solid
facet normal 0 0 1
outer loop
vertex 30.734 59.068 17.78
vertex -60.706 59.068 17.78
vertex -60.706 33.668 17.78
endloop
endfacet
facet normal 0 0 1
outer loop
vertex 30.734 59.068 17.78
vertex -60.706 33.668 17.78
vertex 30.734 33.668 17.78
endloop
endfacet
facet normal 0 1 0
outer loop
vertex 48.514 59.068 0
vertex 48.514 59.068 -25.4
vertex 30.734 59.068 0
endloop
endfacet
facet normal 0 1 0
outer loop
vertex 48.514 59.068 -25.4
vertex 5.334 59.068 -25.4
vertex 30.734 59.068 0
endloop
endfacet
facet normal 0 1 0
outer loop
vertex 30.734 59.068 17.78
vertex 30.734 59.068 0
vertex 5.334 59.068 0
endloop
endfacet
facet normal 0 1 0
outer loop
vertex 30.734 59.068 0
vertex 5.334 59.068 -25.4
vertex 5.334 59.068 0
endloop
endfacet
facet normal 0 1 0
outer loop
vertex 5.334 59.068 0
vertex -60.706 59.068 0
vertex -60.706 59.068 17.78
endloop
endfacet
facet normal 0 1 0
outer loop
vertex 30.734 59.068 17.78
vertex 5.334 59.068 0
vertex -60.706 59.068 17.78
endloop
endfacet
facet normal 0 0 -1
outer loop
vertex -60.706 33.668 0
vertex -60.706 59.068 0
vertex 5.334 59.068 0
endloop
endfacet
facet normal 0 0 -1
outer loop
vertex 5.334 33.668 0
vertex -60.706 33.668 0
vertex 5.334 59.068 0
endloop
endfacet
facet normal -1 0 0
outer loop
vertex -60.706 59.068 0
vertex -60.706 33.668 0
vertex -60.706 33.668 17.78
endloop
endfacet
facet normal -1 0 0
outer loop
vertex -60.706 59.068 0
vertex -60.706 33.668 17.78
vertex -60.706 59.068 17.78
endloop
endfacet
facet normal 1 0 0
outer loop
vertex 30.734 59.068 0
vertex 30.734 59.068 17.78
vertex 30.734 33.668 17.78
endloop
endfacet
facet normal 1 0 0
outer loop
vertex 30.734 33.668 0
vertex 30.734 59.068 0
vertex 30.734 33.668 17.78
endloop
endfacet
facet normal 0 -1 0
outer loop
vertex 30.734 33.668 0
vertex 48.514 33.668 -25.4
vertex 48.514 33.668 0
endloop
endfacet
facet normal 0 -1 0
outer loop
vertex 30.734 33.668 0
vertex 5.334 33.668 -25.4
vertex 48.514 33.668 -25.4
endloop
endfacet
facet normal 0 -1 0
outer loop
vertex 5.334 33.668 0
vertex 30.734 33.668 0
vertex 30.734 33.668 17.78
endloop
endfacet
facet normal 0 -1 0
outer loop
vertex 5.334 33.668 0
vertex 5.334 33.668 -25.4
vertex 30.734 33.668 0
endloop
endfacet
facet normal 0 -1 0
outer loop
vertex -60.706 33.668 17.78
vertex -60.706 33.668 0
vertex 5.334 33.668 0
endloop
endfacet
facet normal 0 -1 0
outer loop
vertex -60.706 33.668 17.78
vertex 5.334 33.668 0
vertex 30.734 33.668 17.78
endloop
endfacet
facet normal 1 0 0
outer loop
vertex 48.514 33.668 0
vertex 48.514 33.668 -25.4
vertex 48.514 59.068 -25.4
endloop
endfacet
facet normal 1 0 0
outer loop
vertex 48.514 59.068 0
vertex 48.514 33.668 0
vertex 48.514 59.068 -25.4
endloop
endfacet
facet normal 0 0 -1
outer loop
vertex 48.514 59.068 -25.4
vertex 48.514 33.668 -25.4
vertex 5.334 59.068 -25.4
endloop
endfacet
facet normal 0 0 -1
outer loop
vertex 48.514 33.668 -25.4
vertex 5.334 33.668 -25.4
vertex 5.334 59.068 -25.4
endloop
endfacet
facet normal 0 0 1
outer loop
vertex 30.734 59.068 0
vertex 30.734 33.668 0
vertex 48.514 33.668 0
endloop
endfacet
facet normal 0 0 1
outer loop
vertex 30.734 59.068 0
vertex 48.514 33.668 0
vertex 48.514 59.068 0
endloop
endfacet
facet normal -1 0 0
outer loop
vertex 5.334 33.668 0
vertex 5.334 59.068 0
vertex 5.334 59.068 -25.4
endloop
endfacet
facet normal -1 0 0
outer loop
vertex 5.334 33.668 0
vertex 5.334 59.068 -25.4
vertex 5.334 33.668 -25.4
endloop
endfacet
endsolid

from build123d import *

# Parameters (mm, degrees)
F0_W     = 91.44
F0_H     = 25.4
F1_DEPTH = 17.78
F2_W     = 25.4
F2_H     = 25.4
F3_DEPTH = 25.4
F4_W     = 25.4
F4_H     = 25.4
F5_DEPTH = 17.78


with BuildPart() as f1:
    # F0 (on Top) → F1 (new body)
    with BuildSketch(Plane.XY):
        with Locations((-14.985616, 46.367901)):
            Rectangle(F0_W, F0_H)
    extrude(amount=F1_DEPTH)

    # F2 (on face) → F3 (join)
    with BuildSketch(Plane(origin=(0, 0, 0), x_dir=(1, 0, 0), z_dir=(0, 0, -1))):
        with Locations((18.034384, -46.367901)):
            Rectangle(F2_W, F2_H)
    extrude(amount=F3_DEPTH)

    # F4 (on face) → F5 (join)
    with BuildSketch(Plane.YZ.offset(30.734384)):
        with Locations((46.367901, -12.7)):
            Rectangle(F4_W, F4_H)
    extrude(amount=F5_DEPTH)


solid = f1.part
